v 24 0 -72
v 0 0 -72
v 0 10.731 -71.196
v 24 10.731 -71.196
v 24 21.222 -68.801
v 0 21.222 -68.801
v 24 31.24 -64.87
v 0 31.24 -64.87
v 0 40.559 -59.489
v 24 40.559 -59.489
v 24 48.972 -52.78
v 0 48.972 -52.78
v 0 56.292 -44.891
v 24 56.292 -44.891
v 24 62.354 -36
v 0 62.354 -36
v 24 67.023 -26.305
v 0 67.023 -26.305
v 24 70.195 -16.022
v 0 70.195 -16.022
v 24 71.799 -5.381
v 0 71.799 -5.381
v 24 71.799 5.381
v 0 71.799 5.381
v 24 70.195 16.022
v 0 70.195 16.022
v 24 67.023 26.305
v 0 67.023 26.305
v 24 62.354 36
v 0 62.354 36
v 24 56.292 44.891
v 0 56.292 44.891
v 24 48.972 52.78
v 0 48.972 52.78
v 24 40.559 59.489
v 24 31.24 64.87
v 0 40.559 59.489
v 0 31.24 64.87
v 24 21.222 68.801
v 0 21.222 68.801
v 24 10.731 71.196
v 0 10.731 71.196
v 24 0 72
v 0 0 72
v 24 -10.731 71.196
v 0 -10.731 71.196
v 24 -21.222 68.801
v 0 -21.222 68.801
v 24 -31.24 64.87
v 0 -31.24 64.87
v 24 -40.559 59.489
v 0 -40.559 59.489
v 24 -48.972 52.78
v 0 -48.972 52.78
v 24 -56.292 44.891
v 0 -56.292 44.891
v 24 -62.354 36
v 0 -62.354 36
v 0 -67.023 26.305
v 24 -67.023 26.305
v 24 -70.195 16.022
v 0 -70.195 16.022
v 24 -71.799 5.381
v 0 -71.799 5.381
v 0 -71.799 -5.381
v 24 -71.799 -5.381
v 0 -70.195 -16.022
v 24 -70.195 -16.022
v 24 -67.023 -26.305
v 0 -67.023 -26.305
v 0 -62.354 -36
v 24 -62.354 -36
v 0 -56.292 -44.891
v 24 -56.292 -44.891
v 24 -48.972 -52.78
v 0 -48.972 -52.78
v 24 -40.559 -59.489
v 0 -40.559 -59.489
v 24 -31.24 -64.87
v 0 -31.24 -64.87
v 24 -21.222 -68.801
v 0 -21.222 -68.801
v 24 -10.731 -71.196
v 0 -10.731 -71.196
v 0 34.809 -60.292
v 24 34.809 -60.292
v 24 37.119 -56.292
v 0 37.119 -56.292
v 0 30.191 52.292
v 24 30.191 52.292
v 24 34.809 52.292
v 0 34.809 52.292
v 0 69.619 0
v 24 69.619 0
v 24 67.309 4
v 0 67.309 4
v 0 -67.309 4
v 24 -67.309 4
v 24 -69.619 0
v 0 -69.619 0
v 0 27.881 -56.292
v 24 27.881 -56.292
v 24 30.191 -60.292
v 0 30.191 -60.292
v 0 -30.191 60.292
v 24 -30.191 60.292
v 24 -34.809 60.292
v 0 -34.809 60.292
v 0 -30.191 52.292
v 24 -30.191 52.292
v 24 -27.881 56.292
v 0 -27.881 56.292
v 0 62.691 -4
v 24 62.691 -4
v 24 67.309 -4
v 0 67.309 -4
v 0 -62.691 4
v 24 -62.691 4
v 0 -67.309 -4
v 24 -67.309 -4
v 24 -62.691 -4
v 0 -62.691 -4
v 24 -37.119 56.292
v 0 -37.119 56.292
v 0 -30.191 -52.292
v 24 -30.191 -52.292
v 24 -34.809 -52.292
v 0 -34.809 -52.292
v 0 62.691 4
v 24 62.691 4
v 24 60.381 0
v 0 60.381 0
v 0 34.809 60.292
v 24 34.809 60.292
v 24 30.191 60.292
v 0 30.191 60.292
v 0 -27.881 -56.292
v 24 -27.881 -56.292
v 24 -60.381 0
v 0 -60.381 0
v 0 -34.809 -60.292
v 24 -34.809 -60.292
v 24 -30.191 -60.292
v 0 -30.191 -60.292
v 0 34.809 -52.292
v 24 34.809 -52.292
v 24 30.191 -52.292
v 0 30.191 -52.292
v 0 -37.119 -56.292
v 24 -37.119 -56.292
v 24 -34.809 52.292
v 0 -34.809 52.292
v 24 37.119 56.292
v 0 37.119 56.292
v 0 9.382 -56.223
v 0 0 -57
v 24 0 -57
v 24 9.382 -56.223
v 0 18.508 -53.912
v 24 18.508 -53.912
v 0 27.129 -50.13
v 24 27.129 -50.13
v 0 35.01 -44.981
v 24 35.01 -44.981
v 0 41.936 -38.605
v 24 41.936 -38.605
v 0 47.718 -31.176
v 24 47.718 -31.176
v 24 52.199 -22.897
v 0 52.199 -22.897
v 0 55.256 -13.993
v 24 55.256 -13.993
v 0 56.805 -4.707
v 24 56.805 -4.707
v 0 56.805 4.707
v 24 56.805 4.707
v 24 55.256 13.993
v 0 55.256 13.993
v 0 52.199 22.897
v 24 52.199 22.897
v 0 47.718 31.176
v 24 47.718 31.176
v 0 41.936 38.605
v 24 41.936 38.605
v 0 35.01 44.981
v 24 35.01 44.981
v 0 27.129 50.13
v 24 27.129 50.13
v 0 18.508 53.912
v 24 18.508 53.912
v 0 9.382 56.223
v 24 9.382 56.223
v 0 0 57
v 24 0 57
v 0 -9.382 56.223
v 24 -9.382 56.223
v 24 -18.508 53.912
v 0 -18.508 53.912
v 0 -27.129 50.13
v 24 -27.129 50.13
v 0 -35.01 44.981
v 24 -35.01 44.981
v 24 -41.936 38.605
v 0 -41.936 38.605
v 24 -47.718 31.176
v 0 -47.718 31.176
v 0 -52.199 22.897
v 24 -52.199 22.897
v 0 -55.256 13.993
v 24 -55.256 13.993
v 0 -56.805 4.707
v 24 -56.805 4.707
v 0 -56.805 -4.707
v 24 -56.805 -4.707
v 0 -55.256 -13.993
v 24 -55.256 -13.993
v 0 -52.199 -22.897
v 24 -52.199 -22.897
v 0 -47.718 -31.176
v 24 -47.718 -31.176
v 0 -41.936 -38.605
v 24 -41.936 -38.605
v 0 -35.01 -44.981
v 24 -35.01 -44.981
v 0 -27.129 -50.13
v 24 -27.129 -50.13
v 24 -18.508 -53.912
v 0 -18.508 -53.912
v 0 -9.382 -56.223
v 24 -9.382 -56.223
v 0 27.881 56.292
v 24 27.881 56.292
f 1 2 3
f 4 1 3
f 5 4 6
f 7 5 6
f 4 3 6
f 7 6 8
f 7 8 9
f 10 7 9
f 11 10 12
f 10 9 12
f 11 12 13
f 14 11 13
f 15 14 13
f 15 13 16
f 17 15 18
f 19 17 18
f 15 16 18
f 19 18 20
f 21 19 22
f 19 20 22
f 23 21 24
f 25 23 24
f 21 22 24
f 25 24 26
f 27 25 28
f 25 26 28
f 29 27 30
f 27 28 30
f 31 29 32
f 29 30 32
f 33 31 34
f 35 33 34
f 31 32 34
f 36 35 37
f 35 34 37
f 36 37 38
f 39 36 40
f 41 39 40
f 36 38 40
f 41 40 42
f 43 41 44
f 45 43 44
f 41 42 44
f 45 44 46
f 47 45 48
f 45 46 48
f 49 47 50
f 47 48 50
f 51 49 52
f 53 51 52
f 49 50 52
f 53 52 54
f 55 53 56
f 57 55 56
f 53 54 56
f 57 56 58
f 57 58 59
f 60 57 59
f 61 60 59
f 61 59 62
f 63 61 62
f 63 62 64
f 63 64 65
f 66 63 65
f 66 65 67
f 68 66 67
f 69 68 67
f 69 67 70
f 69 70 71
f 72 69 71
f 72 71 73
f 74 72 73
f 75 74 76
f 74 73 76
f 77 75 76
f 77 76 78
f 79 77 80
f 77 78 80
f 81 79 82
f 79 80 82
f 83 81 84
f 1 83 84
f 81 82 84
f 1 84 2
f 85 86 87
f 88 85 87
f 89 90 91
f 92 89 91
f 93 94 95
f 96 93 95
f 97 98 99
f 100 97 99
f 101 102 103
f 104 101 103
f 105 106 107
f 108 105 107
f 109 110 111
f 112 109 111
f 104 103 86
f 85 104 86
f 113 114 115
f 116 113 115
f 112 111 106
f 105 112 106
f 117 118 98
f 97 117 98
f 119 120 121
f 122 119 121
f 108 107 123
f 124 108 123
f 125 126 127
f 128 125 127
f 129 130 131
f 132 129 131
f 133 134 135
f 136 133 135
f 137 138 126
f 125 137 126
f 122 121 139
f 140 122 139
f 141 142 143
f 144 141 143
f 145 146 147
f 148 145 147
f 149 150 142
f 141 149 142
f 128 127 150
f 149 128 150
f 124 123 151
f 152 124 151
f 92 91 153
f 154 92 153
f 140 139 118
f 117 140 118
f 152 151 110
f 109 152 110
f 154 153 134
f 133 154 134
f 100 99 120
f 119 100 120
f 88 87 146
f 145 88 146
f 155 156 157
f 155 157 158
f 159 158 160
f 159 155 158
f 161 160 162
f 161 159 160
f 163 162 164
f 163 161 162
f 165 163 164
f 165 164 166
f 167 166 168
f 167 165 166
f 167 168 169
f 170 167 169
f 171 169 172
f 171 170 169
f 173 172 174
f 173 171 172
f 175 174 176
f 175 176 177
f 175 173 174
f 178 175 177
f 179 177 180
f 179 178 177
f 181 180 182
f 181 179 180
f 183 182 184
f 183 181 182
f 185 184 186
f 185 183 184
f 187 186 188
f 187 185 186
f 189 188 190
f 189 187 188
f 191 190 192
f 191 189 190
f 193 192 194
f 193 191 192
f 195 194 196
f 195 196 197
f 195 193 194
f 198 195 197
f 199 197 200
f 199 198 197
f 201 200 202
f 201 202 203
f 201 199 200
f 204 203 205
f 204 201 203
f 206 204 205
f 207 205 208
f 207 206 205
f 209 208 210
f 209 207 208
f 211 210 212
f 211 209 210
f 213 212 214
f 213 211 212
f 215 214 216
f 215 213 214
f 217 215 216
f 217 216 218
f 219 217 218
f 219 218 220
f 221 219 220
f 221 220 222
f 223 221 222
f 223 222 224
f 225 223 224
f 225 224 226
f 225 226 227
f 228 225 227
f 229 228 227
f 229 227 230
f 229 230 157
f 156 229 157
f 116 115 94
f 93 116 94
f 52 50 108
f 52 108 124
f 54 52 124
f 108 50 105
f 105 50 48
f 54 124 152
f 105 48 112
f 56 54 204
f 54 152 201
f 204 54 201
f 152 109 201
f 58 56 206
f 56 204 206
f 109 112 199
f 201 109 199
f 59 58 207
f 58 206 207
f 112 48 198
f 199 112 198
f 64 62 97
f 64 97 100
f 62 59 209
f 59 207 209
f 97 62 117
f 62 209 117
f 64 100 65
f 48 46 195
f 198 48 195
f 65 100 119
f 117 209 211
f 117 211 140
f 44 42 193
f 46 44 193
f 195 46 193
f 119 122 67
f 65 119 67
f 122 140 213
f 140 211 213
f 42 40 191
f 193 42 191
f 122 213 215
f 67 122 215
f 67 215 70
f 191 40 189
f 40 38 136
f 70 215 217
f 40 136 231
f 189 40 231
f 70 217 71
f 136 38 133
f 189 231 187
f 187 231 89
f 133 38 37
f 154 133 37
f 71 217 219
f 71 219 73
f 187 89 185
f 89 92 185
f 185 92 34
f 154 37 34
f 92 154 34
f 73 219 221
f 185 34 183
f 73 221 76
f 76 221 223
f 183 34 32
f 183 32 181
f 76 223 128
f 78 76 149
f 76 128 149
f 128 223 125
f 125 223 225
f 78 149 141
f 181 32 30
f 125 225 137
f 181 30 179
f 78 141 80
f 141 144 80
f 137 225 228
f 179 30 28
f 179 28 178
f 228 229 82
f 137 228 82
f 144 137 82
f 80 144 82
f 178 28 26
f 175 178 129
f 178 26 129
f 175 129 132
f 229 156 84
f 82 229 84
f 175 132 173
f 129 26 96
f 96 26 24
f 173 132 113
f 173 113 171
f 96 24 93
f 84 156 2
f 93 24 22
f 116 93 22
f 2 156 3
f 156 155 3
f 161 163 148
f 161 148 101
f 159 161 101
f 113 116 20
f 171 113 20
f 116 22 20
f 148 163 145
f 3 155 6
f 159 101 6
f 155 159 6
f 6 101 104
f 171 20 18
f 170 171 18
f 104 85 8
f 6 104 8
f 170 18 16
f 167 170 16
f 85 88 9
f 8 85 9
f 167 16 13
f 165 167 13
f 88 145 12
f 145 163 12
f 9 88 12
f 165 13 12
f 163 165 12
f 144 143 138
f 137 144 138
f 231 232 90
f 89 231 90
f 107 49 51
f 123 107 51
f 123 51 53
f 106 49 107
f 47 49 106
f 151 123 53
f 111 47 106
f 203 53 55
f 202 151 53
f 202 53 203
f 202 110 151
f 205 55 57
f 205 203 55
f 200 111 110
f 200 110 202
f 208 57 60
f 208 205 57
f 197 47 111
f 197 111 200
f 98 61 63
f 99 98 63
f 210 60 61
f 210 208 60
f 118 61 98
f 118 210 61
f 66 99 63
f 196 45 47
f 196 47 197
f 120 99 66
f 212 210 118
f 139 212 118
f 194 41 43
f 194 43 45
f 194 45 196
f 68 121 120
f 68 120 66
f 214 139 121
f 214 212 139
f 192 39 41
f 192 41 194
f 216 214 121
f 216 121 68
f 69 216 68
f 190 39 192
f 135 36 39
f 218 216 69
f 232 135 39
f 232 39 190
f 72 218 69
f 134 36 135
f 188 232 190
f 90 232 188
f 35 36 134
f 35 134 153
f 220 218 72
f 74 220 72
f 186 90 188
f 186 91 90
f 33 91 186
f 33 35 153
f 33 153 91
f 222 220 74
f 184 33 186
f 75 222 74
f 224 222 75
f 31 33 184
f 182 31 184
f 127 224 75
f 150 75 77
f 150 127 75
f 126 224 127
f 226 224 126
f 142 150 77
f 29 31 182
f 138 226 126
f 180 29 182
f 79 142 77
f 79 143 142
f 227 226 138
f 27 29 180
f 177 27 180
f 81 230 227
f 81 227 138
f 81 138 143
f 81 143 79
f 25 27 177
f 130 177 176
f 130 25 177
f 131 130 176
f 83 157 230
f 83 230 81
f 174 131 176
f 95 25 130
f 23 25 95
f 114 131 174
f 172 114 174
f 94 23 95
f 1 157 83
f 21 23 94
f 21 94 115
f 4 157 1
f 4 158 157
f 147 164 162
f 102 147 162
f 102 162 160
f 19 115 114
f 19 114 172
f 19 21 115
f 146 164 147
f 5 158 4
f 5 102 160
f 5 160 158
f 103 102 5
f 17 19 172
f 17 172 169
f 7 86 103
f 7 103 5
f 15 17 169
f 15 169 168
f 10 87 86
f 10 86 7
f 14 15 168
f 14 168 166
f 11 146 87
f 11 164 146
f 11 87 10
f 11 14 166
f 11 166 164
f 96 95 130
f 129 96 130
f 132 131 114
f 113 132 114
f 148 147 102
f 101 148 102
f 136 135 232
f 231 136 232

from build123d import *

# Parameters (mm, degrees)
SKETCH1_R           = 72
SKETCH1_R_2         = 57
BOSS_EXTRUDE1_DEPTH = 24
CUT_EXTRUDE1_DEPTH  = 24


with BuildPart() as part:
    # Sketch1 → Boss-Extrude1 (new body)
    with BuildSketch(Plane(origin=(0, 0, 0), x_dir=(0, 0, -1), z_dir=(1, 0, 0))):
        Circle(SKETCH1_R)
        Circle(SKETCH1_R_2, mode=Mode.SUBTRACT)
    extrude(amount=BOSS_EXTRUDE1_DEPTH)

    # Sketch2 → Cut-Extrude1 (cut)
    with BuildSketch(Plane(origin=(24, 0, 0), x_dir=(0, 0, -1), z_dir=(1, 0, 0))):
        Polygon((52.291651246, 30.190598923), (56.291651246, 27.881197846), (60.291651246, 30.190598923), (60.291651246, 34.809401077), (56.291651246, 37.118802154), (52.291651246, 34.809401077), align=None)
        Polygon((0, 60.381197846), (4, 62.690598923), (4, 67.309401077), (0, 69.618802154), (-4, 67.309401077), (-4, 62.690598923), align=None)
        Polygon((52.291651246, -30.190598923), (52.291651246, -34.809401077), (56.291651246, -37.118802154), (60.291651246, -34.809401077), (60.291651246, -30.190598923), (56.291651246, -27.881197846), align=None)
        Polygon((0, -60.381197846), (-4, -62.690598923), (-4, -67.309401077), (0, -69.618802154), (4, -67.309401077), (4, -62.690598923), align=None)
        Polygon((-52.291651246, -30.190598923), (-56.291651246, -27.881197846), (-60.291651246, -30.190598923), (-60.291651246, -34.809401077), (-56.291651246, -37.118802154), (-52.291651246, -34.809401077), align=None)
        Polygon((-52.291651246, 30.190598923), (-52.291651246, 34.809401077), (-56.291651246, 37.118802154), (-60.291651246, 34.809401077), (-60.291651246, 30.190598923), (-56.291651246, 27.881197846), align=None)
    extrude(amount=-CUT_EXTRUDE1_DEPTH, mode=Mode.SUBTRACT)


solid = part.part
